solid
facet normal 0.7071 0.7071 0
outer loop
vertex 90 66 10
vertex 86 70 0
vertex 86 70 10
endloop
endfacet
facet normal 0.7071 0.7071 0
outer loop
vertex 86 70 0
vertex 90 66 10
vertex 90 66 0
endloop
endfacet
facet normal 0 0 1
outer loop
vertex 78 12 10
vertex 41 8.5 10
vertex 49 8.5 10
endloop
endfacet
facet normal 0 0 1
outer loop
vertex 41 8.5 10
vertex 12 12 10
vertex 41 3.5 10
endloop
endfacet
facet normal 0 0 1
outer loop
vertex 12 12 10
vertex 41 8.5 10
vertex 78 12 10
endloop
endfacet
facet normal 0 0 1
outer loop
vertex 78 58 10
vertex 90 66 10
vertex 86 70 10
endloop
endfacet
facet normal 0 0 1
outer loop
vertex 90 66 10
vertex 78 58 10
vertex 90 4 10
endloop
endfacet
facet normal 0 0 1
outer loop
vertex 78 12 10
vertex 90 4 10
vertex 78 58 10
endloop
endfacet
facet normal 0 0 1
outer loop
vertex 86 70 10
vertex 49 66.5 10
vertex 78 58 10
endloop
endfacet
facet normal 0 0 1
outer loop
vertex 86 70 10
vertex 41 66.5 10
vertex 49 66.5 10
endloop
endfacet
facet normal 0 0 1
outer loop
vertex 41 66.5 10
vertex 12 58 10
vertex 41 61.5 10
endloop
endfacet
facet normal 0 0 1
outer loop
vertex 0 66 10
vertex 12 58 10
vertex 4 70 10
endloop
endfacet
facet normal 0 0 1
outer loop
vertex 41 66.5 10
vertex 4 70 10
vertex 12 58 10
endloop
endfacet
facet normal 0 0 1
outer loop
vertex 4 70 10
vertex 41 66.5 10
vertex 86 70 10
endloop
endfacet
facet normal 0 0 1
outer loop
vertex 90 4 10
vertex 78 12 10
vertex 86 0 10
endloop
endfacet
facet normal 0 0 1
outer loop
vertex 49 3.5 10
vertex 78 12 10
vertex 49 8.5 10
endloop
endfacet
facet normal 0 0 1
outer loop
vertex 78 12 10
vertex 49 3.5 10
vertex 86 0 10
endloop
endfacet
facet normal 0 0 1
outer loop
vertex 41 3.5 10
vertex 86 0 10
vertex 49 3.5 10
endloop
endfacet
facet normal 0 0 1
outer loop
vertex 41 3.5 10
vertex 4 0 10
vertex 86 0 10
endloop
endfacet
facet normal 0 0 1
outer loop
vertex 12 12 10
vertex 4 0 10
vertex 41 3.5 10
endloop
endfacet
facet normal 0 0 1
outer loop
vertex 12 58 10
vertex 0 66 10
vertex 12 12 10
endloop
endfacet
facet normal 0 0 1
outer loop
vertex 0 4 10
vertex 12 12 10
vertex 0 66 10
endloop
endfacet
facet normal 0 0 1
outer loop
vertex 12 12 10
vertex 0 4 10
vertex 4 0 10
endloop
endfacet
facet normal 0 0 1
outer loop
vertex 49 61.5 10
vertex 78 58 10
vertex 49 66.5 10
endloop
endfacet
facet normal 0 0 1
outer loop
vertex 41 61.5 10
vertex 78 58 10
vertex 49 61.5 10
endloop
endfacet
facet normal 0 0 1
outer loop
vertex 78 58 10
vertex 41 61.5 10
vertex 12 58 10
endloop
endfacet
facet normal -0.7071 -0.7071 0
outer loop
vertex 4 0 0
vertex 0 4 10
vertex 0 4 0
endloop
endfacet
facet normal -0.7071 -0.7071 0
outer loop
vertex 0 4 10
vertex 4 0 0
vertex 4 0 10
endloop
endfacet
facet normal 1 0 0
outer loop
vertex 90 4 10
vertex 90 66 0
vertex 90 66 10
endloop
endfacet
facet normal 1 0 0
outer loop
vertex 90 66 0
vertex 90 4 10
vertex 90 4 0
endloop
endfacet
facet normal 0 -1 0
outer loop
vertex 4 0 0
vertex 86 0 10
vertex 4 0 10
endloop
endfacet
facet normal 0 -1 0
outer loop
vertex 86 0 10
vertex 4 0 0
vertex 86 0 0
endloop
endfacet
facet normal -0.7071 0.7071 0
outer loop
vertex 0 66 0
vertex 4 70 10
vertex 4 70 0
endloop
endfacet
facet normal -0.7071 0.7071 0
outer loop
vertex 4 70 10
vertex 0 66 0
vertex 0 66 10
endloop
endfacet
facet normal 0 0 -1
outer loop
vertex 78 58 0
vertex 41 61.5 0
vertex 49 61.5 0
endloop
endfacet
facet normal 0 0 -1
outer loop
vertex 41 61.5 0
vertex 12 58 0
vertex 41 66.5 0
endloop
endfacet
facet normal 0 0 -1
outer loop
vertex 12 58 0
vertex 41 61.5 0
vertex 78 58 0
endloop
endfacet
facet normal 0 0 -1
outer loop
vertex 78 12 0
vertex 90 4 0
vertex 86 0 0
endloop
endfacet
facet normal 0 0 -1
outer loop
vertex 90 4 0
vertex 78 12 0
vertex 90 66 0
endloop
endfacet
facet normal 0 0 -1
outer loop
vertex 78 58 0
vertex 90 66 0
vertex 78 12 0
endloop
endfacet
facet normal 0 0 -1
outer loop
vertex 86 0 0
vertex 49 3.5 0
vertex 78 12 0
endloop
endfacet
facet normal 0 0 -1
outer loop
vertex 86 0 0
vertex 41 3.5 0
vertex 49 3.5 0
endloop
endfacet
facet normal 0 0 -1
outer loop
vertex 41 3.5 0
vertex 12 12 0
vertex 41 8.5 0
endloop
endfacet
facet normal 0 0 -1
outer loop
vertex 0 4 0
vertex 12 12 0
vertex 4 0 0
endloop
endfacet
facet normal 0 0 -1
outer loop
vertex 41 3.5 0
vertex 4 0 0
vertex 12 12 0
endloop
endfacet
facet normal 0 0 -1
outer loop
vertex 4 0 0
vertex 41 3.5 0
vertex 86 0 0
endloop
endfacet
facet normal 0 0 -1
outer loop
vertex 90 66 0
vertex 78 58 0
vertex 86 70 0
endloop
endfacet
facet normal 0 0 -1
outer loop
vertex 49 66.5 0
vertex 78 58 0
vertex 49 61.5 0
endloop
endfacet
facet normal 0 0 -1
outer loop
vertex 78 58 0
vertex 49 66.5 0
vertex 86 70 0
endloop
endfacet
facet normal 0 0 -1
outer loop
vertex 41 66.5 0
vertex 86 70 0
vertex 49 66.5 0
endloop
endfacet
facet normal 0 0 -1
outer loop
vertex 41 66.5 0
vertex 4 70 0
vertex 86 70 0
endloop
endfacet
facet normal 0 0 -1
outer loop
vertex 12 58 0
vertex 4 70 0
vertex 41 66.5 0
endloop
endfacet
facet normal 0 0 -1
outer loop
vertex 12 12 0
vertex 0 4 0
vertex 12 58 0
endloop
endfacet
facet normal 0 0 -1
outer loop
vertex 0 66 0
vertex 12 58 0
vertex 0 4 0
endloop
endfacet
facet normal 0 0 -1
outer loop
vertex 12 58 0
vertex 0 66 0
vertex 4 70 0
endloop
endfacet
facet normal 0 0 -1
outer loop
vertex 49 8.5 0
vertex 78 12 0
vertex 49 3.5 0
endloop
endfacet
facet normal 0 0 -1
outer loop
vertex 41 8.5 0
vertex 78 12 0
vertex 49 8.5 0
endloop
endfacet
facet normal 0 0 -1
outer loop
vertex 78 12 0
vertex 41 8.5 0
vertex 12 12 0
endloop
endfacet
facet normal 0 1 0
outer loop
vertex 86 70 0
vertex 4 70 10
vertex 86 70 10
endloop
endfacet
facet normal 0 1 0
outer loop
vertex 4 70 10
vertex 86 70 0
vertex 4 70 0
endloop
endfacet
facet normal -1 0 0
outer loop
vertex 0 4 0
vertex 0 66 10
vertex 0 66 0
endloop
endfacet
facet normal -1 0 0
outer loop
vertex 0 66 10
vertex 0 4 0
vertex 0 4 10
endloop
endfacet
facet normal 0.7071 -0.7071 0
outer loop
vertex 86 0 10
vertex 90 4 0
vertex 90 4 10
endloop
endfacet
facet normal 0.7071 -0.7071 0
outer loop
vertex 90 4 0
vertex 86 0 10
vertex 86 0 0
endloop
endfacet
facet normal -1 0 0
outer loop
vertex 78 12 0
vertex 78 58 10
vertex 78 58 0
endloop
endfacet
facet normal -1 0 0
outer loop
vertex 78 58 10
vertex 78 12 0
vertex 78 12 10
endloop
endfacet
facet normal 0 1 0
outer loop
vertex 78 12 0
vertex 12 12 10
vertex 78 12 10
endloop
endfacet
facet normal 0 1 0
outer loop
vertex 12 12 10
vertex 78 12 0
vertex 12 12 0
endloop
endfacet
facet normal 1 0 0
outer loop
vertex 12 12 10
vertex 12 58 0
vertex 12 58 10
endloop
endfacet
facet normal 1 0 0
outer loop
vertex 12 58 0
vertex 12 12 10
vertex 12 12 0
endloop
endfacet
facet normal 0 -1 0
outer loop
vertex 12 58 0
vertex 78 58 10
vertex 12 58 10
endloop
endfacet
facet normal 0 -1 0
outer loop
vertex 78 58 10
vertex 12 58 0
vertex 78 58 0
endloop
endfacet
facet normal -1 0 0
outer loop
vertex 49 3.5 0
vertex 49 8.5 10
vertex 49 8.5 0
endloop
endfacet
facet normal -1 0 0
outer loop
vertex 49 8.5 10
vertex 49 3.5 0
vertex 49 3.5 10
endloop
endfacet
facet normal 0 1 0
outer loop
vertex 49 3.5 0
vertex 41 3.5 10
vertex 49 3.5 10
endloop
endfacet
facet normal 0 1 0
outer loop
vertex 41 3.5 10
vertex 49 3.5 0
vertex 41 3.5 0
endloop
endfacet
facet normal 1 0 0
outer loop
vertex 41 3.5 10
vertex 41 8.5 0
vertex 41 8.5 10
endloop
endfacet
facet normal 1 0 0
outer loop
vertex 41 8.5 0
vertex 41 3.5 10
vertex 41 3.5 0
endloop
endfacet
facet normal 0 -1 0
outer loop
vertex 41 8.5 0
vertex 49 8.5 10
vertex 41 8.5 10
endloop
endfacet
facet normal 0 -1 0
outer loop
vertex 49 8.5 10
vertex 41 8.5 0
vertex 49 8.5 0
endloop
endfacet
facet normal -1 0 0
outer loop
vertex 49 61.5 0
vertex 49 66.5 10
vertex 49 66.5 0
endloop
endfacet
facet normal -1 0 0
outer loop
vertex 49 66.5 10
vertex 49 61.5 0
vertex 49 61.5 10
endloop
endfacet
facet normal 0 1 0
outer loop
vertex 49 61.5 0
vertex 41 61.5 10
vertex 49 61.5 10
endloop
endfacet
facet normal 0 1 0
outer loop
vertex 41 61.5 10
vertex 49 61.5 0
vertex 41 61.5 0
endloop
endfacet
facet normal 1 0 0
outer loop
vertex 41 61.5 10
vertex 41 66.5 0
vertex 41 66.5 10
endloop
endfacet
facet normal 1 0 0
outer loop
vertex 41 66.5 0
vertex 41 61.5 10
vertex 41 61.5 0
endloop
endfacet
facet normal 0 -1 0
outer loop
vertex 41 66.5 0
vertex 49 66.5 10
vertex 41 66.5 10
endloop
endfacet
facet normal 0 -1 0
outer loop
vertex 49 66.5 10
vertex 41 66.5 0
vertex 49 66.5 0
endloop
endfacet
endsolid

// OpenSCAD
$fn = 32;

// ----------------------------------------------------------------------
// Frame plate: 90 x 70 frame, 12 mm rails
// ----------------------------------------------------------------------

// --- parameters (mm) ---
plate_l = 90;             // plate length, X
plate_w = 70;             // plate width, Y
plate_t = 10;             // plate thickness, Z (extrusion height)
corner_c = 4;             // corner chamfer
frame_bar = 12;           // frame rail width
slot_l = 8;               // adjustment slot length
slot_w = 5;               // adjustment slot width
fit_tol = 0.1;            // declared fit tolerance (prompt contract)
free_tol = 0.3;           // declared free tolerance (prompt contract)

win_l = plate_l - 2 * frame_bar;  // window length
win_w = plate_w - 2 * frame_bar;  // window width

profile = [[4, 0], [86, 0], [90, 4], [90, 66], [86, 70], [4, 70], [0, 66], [0, 4]];  // primary outline, 8 points, counter clockwise
void_1 = [[12, 12], [78, 12], [78, 58], [12, 58]];  // the window, 4 points
void_2 = [[41, 3.5], [49, 3.5], [49, 8.5], [41, 8.5]];  // adjustment slot, 4 points
void_3 = [[41, 61.5], [49, 61.5], [49, 66.5], [41, 66.5]];  // adjustment slot, 4 points

// --- the one profile operation ---
difference() {
  linear_extrude(height = plate_t) polygon(points = profile);
  translate([0, 0, -1])
    linear_extrude(height = plate_t + 2) polygon(points = void_1);
  translate([0, 0, -1])
    linear_extrude(height = plate_t + 2) polygon(points = void_2);
  translate([0, 0, -1])
    linear_extrude(height = plate_t + 2) polygon(points = void_3);
}
